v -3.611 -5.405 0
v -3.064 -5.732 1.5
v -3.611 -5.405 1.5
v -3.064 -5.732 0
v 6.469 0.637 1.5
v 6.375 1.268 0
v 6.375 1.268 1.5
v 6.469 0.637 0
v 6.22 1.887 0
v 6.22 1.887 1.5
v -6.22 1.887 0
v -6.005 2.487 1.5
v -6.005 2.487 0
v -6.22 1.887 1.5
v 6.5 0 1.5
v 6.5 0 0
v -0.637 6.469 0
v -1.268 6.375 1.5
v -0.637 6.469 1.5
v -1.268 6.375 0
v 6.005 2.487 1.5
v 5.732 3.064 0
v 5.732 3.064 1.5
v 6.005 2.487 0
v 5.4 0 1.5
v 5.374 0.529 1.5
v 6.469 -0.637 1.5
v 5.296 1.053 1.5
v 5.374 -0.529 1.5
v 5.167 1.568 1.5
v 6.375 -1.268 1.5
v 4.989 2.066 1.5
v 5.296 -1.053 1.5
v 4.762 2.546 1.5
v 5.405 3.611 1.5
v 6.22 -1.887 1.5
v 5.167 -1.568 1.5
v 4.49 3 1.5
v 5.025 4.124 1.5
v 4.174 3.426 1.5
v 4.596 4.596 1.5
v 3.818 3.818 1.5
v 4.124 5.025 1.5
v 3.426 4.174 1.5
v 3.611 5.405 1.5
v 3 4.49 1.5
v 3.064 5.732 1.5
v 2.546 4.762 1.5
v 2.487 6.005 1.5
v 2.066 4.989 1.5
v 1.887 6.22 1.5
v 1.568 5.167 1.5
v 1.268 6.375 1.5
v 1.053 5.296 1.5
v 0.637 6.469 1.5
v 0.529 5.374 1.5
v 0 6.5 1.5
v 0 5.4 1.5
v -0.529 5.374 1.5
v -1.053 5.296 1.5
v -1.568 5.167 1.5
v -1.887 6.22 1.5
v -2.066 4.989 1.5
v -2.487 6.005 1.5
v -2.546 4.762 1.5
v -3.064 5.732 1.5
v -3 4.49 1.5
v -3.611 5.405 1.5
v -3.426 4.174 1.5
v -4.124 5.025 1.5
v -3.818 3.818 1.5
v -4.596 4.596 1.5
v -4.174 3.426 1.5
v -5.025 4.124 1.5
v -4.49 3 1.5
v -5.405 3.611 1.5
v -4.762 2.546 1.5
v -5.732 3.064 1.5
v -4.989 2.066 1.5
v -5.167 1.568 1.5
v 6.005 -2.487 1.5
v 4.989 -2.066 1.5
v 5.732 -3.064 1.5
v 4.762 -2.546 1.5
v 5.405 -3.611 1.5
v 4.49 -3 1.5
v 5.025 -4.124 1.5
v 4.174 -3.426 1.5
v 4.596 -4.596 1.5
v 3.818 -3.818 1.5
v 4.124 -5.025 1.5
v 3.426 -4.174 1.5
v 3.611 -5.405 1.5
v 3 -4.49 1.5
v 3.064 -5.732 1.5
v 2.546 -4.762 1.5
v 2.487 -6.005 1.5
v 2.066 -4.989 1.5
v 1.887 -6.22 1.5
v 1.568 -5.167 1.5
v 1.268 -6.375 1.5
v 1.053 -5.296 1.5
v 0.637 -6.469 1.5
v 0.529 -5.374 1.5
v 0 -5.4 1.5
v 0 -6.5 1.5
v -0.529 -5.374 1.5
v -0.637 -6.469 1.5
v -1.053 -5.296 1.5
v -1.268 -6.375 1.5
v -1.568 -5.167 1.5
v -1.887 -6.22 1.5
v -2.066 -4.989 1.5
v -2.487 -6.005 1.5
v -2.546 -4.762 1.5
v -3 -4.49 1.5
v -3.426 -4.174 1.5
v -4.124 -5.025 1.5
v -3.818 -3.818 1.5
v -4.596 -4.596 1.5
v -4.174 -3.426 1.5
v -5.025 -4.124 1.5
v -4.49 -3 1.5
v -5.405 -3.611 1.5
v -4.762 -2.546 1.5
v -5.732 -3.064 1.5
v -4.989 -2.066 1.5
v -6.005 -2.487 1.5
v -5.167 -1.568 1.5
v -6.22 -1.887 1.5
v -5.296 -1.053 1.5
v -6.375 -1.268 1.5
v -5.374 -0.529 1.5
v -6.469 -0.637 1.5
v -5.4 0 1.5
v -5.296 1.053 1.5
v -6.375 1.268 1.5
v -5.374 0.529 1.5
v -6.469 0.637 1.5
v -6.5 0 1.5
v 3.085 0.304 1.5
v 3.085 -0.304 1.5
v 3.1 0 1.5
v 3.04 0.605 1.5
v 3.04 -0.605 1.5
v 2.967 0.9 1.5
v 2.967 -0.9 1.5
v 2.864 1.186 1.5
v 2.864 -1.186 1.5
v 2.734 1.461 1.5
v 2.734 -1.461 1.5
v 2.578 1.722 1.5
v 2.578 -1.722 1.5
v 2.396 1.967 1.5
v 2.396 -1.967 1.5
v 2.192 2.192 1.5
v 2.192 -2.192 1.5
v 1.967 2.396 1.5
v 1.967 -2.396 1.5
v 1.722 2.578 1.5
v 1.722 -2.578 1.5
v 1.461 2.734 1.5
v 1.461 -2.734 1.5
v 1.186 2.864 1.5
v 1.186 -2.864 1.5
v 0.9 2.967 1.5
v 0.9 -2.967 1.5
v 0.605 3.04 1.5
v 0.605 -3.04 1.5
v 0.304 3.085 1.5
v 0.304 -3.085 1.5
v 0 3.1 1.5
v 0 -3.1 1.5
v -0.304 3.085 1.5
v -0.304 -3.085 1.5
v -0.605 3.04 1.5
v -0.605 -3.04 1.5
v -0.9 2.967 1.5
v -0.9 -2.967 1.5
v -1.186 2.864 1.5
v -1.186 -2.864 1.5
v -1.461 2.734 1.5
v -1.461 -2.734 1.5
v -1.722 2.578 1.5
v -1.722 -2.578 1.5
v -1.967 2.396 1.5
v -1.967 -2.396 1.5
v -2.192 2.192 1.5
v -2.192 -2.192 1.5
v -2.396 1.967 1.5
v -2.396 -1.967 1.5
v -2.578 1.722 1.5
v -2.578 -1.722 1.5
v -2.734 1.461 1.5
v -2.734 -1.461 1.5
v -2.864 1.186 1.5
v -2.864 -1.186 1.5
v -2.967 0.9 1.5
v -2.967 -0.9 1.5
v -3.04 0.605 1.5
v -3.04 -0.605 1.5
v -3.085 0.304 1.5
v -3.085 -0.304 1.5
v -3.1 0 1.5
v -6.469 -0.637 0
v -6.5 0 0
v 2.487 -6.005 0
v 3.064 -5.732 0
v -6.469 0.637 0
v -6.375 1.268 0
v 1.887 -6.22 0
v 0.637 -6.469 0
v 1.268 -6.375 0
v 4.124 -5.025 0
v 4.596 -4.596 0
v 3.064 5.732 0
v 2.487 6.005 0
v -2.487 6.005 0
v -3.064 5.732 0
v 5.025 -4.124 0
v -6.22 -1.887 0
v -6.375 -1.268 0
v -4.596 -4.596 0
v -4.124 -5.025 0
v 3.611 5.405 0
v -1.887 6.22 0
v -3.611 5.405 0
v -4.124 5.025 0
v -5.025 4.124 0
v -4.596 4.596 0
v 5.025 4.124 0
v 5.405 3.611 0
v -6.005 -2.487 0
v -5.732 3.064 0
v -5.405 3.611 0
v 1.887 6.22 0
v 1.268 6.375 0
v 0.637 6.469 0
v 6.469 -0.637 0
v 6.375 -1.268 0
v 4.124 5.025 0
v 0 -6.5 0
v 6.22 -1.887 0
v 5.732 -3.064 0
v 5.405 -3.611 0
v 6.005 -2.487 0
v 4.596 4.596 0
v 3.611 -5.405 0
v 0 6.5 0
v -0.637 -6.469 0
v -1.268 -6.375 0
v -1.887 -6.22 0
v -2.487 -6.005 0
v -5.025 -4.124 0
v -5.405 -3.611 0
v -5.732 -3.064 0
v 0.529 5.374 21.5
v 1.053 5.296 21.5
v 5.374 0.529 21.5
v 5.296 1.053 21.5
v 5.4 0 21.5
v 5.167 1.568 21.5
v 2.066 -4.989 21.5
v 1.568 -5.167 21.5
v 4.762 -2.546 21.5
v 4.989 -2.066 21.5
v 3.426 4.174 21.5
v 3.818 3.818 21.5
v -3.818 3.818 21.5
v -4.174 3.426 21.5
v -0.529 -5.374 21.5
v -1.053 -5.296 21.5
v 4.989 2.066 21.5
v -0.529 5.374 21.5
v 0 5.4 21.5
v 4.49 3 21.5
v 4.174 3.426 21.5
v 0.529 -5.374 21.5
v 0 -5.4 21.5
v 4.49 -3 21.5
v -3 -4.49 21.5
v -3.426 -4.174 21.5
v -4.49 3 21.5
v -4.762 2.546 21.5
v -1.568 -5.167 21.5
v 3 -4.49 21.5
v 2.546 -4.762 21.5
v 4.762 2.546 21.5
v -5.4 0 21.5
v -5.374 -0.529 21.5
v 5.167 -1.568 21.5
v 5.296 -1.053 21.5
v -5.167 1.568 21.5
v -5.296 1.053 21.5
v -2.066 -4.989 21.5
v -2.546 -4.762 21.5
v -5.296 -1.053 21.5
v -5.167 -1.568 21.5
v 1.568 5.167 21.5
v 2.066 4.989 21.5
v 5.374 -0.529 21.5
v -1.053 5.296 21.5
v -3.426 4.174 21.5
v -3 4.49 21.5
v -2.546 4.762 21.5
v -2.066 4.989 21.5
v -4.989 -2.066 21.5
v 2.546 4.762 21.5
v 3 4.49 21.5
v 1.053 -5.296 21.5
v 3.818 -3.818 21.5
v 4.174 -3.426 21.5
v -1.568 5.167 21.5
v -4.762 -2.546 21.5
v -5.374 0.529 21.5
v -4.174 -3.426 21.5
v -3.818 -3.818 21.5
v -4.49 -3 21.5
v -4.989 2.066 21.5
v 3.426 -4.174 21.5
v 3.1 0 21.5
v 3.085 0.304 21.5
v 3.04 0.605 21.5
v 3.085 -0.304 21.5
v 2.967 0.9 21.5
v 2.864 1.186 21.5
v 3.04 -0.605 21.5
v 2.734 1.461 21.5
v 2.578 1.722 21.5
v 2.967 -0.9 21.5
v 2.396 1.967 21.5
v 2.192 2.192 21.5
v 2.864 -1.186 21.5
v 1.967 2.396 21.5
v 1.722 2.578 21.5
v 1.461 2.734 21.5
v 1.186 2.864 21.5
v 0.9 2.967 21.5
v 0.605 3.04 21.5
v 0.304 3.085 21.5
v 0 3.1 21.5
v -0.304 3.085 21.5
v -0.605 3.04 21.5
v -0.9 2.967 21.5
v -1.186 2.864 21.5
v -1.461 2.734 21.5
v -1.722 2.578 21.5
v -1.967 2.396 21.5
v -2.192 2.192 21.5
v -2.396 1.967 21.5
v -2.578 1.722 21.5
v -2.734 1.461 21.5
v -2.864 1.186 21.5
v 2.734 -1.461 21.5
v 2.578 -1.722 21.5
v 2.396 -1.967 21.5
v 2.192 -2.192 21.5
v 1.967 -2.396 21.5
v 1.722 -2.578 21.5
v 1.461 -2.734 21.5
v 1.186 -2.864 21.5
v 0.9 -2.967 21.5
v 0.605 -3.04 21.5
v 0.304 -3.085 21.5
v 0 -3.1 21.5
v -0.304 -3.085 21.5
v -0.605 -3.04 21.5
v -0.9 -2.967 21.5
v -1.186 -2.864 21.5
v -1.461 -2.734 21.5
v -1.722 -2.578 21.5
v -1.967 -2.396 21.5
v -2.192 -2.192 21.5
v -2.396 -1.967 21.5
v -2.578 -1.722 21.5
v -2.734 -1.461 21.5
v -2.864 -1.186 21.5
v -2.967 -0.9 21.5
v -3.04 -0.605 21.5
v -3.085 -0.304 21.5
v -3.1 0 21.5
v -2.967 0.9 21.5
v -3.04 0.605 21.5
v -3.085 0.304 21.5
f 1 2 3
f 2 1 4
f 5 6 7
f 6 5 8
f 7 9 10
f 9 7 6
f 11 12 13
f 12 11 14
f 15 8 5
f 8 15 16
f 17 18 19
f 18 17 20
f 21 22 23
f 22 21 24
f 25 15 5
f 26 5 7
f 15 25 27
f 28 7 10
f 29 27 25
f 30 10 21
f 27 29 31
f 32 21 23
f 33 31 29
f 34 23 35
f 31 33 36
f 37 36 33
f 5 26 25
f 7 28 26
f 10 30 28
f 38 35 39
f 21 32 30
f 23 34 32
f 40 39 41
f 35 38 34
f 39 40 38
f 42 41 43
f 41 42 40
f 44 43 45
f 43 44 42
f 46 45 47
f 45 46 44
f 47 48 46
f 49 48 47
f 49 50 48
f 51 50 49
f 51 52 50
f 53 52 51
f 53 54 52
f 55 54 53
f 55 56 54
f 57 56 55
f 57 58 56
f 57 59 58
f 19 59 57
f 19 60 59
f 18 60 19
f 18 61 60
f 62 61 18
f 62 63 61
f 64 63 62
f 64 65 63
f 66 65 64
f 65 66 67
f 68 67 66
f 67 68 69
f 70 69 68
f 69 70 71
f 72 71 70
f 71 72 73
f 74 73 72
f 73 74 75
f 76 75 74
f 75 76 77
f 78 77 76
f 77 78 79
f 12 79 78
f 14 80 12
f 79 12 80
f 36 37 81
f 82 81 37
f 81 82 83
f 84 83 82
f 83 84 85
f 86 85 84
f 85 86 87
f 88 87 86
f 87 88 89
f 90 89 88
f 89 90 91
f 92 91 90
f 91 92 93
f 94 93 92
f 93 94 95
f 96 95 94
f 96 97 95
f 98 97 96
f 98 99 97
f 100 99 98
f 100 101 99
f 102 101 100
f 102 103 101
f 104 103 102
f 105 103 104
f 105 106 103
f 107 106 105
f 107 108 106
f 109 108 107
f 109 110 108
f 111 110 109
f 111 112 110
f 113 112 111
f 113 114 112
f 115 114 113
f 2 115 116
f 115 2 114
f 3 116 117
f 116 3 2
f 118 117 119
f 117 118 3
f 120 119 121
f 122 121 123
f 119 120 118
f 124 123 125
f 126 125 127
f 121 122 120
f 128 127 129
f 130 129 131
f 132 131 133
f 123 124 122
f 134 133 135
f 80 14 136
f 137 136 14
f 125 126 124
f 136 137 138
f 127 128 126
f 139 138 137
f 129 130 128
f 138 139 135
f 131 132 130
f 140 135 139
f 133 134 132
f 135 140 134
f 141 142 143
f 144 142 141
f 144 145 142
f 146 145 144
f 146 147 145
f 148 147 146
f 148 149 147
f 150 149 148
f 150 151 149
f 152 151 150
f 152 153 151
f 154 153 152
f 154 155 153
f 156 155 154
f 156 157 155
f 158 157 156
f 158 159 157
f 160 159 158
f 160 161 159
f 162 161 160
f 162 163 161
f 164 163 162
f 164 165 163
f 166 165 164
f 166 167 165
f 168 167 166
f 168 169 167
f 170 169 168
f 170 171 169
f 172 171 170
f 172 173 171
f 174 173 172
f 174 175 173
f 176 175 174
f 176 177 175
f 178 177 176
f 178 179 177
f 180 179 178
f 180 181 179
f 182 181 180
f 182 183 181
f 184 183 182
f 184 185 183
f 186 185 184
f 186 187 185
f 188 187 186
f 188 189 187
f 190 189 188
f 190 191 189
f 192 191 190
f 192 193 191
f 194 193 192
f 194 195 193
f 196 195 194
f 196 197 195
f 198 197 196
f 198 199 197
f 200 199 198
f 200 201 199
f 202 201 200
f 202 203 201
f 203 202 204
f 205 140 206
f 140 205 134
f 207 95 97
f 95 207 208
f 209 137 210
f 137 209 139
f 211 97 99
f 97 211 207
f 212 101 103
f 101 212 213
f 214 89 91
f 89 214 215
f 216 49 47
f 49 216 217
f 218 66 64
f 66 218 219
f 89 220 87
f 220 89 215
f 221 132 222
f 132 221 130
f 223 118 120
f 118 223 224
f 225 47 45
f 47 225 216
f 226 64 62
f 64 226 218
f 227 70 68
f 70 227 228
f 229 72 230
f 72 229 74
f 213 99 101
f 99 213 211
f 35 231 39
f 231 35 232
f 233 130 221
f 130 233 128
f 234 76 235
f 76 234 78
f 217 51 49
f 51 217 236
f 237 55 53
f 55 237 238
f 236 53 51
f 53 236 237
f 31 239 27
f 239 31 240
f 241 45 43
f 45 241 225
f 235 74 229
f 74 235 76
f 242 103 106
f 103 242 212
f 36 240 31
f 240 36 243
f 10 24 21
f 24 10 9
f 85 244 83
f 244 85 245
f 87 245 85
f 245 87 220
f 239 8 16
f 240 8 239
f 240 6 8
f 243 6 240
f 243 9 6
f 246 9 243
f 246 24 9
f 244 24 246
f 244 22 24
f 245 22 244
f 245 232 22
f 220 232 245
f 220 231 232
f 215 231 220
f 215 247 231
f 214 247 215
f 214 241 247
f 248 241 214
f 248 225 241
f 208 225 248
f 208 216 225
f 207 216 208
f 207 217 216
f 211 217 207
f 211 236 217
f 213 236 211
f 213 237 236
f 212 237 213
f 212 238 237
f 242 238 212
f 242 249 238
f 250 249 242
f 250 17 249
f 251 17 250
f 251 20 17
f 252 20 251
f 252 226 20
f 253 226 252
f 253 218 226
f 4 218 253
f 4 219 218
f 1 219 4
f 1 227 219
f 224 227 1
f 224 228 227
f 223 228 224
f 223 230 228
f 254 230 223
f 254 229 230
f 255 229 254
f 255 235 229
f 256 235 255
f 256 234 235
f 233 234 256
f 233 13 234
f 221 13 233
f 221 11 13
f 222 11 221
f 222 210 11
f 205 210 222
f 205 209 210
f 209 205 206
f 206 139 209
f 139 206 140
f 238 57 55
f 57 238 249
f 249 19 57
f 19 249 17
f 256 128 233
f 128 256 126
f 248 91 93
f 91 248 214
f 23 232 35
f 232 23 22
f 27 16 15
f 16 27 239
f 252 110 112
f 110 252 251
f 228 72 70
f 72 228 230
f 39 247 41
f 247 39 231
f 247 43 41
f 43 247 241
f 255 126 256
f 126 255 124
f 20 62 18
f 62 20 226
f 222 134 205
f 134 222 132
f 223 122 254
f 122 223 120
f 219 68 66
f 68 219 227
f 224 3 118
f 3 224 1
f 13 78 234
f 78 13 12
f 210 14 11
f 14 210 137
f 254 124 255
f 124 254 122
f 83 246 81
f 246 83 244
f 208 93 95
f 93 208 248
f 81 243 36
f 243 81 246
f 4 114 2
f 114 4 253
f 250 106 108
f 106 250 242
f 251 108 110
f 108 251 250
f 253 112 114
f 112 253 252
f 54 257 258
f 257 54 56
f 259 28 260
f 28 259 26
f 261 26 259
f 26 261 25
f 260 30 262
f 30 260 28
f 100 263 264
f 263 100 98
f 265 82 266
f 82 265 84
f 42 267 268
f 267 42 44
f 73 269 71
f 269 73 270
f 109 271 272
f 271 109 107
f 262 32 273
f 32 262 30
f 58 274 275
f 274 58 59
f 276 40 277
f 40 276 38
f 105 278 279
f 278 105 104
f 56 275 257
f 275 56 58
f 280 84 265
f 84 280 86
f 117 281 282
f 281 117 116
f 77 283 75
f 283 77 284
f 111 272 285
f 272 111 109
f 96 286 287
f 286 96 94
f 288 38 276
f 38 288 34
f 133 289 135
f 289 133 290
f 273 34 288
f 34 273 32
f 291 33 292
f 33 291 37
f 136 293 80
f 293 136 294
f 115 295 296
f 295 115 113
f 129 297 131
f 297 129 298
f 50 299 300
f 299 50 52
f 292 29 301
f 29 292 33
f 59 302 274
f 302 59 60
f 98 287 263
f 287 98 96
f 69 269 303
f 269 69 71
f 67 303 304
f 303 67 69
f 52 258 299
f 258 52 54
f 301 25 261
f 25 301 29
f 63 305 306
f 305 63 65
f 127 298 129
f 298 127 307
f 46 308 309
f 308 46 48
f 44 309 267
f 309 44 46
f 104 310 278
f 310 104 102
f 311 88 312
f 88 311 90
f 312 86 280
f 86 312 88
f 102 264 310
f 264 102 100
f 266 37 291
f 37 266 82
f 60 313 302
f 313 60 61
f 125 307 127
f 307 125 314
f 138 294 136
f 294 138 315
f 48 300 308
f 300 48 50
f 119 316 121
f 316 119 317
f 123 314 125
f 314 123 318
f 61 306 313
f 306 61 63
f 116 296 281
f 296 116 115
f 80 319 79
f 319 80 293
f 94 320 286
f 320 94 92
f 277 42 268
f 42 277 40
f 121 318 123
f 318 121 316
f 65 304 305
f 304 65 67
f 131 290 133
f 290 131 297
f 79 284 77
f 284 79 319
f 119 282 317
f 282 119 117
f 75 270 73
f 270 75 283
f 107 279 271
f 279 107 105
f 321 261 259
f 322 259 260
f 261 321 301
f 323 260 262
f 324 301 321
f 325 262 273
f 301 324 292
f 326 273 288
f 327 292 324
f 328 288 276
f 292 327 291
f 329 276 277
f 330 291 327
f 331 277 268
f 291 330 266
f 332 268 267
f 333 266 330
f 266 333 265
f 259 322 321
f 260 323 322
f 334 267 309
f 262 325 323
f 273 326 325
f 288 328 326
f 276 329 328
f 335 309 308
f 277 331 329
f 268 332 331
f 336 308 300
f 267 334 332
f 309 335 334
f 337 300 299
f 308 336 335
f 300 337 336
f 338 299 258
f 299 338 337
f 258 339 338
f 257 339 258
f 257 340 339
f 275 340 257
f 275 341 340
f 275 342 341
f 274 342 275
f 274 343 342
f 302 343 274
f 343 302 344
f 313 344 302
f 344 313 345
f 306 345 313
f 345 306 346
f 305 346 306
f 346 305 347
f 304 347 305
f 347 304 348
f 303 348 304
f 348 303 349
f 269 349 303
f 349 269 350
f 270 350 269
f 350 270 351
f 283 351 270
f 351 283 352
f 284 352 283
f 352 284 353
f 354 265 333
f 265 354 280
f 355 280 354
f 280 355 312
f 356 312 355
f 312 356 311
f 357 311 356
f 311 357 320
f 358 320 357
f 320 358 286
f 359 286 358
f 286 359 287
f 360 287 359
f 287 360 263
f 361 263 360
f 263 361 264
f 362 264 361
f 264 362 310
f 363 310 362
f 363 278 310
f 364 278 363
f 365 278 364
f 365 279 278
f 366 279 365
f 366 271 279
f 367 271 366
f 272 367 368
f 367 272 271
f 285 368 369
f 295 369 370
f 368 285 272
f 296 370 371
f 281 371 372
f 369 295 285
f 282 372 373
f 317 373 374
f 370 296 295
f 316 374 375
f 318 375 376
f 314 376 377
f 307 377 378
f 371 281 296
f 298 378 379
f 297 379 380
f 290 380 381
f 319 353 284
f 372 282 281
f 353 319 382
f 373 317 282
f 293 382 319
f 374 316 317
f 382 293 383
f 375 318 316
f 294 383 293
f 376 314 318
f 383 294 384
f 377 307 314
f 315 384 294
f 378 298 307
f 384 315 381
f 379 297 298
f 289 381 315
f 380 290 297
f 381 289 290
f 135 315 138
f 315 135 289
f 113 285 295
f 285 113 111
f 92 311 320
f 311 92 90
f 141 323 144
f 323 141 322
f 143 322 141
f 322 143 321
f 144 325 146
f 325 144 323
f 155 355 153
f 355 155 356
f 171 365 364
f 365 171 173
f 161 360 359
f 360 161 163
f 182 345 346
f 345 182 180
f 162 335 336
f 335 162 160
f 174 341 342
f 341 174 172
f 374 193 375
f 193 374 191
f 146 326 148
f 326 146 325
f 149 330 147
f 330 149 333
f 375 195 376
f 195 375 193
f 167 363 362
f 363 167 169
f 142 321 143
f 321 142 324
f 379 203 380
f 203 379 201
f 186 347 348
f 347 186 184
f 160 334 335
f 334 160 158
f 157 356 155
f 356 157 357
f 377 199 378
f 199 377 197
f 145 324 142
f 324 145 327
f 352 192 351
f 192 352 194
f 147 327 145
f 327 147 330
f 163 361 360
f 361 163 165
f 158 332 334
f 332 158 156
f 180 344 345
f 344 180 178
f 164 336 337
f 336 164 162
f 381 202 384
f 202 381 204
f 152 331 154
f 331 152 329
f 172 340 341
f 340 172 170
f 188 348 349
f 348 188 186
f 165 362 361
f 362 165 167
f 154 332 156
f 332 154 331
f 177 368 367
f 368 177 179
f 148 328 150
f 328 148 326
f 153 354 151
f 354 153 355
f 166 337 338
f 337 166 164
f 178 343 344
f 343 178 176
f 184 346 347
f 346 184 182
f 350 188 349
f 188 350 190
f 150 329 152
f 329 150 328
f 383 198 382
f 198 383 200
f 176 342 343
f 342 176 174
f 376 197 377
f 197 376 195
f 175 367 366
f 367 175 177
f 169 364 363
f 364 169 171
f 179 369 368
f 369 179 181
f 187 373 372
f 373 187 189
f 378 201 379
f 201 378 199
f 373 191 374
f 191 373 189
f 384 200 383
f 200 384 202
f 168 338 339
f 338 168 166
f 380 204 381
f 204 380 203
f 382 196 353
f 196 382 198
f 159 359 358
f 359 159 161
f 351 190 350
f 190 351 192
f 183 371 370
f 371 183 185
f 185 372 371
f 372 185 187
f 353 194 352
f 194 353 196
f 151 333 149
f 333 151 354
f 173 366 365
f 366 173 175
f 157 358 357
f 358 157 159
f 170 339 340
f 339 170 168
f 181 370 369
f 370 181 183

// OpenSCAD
// Built by bench/smallmodels/features/compiler.py from a list of features.
$fn = 64;
union() {
    translate([0, 0, 0]) difference() { cylinder(d = 13, h = 1.5); translate([0, 0, -0.01]) cylinder(d = 0, h = 1.52); }
    translate([0, 0, 1.5]) difference() { cylinder(d = 10.8, h = 20); translate([0, 0, -0.01]) cylinder(d = 6.2, h = 20.02); }
  }
